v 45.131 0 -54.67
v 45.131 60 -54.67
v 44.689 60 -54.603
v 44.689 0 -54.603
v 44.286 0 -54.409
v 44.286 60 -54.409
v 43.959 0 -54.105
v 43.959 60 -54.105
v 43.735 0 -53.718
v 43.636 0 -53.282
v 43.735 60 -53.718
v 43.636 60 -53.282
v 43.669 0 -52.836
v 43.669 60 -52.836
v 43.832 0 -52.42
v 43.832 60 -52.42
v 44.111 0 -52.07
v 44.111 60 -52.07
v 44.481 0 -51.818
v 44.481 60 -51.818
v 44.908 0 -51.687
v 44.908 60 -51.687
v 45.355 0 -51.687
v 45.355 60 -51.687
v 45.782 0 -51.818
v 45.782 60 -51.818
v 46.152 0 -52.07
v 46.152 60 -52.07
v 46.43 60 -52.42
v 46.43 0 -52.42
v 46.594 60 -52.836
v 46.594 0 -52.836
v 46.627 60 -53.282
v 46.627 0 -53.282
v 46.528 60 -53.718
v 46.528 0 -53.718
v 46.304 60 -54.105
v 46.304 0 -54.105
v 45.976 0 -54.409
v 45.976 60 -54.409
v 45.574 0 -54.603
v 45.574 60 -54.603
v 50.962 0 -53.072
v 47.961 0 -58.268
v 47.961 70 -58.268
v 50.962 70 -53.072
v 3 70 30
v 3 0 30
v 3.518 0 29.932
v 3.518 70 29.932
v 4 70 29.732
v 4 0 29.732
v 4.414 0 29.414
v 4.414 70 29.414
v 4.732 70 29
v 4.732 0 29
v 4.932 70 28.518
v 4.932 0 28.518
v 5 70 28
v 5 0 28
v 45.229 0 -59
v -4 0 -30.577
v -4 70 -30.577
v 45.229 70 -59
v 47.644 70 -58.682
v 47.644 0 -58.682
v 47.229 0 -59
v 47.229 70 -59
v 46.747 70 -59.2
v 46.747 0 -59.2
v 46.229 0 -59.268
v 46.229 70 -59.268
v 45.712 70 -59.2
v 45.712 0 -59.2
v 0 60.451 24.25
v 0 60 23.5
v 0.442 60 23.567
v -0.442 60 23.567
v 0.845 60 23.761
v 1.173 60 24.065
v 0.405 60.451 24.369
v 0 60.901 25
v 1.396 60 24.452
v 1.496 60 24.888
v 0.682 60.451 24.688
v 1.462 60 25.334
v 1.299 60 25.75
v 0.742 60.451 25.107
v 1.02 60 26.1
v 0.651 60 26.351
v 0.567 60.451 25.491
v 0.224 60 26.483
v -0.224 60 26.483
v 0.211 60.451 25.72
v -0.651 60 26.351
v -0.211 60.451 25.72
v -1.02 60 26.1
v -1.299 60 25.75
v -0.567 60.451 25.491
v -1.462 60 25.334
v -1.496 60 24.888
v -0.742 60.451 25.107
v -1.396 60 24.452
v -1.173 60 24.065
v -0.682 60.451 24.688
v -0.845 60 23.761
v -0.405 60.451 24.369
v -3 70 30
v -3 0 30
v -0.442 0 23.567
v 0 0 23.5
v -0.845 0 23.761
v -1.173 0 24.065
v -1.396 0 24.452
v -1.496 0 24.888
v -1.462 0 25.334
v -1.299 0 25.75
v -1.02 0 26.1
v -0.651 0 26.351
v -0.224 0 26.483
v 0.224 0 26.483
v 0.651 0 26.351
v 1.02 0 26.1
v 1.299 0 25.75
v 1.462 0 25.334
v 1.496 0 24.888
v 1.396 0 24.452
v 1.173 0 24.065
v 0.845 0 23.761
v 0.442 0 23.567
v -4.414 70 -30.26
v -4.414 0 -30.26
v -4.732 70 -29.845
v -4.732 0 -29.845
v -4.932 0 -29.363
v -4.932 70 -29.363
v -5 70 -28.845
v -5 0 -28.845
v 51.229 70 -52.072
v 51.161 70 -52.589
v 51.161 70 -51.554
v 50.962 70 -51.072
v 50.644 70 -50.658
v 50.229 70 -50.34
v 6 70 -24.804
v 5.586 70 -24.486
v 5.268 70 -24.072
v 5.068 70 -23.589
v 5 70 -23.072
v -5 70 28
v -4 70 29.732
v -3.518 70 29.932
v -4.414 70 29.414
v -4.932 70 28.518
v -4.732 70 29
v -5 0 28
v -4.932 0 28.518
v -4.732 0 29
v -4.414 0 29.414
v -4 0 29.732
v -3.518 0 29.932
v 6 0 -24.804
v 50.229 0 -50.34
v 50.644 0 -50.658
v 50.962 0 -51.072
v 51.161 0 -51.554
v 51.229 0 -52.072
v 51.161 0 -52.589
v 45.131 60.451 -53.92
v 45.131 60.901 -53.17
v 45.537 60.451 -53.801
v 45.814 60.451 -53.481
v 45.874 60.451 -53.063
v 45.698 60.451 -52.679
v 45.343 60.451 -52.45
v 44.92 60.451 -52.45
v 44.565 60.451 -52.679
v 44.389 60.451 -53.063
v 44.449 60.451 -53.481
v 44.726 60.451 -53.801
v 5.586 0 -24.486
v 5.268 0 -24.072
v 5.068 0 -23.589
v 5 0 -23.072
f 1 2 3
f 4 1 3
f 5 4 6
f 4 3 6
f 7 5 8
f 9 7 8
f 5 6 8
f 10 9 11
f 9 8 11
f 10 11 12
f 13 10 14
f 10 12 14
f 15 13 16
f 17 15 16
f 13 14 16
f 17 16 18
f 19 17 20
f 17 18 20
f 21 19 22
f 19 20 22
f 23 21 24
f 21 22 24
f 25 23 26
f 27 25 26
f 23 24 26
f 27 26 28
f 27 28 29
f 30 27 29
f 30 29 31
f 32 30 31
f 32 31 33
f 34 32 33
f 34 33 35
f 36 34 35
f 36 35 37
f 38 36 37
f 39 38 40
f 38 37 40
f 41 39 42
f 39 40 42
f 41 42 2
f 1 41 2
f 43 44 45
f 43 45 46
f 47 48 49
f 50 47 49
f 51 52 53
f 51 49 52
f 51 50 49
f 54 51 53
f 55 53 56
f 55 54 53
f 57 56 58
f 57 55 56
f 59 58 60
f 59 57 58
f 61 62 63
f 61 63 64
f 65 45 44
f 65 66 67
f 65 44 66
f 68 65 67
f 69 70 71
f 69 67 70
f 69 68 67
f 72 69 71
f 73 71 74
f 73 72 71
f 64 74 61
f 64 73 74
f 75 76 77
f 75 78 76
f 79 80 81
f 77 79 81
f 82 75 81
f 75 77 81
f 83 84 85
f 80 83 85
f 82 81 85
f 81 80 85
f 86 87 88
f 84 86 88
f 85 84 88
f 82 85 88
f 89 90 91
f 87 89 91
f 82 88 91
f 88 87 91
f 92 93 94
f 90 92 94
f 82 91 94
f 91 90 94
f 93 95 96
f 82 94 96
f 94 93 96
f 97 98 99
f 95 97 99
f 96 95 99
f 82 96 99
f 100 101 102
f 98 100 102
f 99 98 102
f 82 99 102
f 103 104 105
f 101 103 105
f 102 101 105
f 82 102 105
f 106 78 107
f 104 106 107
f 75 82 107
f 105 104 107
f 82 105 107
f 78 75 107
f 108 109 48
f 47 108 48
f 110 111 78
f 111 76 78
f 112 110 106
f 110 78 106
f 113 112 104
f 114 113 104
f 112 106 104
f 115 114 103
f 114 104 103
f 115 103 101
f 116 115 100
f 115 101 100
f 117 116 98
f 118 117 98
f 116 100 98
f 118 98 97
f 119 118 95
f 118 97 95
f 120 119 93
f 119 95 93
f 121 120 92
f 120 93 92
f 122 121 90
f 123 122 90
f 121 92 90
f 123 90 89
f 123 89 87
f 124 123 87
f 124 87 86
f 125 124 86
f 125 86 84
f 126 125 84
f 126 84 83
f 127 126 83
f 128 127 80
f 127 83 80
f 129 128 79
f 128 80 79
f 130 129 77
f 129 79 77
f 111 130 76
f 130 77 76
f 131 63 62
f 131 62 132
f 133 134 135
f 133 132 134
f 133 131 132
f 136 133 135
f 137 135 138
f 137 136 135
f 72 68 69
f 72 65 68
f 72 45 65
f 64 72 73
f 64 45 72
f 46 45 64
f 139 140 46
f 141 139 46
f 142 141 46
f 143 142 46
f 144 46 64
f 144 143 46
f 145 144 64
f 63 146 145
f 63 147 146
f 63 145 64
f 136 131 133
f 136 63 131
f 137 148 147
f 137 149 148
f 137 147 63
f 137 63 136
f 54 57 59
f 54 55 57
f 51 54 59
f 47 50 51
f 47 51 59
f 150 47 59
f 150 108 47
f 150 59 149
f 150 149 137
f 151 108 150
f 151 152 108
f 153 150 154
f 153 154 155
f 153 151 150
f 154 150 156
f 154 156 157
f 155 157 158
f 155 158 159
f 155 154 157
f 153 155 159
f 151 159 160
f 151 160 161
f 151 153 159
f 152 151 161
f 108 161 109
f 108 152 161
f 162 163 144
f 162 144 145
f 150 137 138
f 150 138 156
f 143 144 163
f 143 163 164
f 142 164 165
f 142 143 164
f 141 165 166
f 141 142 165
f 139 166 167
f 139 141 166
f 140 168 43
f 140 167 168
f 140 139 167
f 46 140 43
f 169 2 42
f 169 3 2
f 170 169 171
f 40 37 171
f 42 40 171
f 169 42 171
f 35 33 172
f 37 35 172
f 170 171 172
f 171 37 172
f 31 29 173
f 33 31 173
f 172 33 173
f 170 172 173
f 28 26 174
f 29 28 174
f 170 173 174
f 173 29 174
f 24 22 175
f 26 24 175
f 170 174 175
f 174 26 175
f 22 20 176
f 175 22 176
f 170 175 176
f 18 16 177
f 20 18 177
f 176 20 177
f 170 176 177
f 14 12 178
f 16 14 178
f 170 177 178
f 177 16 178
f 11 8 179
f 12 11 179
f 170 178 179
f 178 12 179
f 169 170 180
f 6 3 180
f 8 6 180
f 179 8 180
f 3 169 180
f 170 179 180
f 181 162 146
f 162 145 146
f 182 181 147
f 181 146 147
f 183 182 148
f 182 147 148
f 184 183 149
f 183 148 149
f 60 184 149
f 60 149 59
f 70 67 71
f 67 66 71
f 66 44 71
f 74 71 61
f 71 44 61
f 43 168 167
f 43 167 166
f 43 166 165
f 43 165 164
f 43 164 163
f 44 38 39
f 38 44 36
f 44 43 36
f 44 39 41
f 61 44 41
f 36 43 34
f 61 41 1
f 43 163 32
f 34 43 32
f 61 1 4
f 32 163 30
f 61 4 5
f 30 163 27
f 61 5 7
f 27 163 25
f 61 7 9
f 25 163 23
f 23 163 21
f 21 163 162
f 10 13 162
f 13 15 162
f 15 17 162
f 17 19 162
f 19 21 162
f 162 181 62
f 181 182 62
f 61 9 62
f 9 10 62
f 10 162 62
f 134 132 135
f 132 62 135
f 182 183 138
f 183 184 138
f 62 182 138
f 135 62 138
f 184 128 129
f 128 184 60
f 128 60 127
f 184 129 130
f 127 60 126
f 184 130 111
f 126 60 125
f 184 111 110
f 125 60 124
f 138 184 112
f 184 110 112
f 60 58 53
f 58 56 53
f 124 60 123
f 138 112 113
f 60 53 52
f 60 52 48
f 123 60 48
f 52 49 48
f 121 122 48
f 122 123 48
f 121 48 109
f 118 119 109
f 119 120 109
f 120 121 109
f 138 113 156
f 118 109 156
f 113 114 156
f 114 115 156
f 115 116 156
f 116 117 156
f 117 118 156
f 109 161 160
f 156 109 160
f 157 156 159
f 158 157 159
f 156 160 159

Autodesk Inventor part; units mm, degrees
ref_plane "YZ Plane" through (0, 0, 0) normal (1, 0, 0) x (0, 1, 0)
ref_plane "XZ Plane" through (0, 0, 0) normal (0, 1, 0) x (-1, 0, 0)
ref_plane "XY Plane" through (0, 0, 0) normal (0, 0, 1) x (1, 0, 0)
sketch "Эскиз1" plane through (0, 0, 0) normal (0, 1, 0) x (-1, 0, 0)
  line L0 (16.3923, 0) -> (-63.3538, 0) construction
  line L1 (5, 30) -> (-5, 30)
  line L2 (5, -30) -> (5, 30)
  line L3 (5, -30) -> (-46.9615, -60)
  line L4 (-46.9615, -60) -> (-51.9615, -51.3397)
  line L5 (-51.9615, -51.3397) -> (-5, -24.2265)
  line L6 (-5, -24.2265) -> (-5, 30)
  line L7 (0, -78) -> (0, 48) construction
  point P0 (0, 0)
  dimension "d13" = 60
  dimension "d16" = 10
  dimension "d17" = 10
  dimension "d18" = 60
  dimension "d19" = 120
extrude "Выдавливание1" add sketch "Эскиз1" along normal blind 70
fillet "Сопряжение1" radius 2 6 edges at (-5, 35, 30) (5, 35, 30) (-5, 35, -30) (51.9615, 35, -51.3397) (46.9615, 35, -60) (5, 35, -24.2265)
sketch "Эскиз7" plane through (0, 0, 0) normal (0, -1, 0) x (1, 0, 0)
  line L0 (-3, 30) -> (3, 30) projected
  line L1 (5, 28) -> (5, -23.0718) projected
  line L2 (6, -24.8038) -> (50.2295, -50.3397) projected
  line L3 (50.9615, -53.0718) -> (47.9615, -58.2679) projected
  point P0 (0, 0)
  point P1 (0, 25)
  point P2 (45.1314, -53.1699)
  dimension "d21" = 5
  dimension "d22" = 5
  dimension "d23" = 5
  dimension "d24" = 5
hole "Отверстие1" at (0, 0, 25) at (45.1314, 0, -53.1699) direction (0, 1, 0) diameter 3 depth 60 tip angle 118
equation "\"d22\" = d21"
equation "\"d23\" = d24"
equation "\"d24\" = d21"
properties part number "Лепесток БСП"
